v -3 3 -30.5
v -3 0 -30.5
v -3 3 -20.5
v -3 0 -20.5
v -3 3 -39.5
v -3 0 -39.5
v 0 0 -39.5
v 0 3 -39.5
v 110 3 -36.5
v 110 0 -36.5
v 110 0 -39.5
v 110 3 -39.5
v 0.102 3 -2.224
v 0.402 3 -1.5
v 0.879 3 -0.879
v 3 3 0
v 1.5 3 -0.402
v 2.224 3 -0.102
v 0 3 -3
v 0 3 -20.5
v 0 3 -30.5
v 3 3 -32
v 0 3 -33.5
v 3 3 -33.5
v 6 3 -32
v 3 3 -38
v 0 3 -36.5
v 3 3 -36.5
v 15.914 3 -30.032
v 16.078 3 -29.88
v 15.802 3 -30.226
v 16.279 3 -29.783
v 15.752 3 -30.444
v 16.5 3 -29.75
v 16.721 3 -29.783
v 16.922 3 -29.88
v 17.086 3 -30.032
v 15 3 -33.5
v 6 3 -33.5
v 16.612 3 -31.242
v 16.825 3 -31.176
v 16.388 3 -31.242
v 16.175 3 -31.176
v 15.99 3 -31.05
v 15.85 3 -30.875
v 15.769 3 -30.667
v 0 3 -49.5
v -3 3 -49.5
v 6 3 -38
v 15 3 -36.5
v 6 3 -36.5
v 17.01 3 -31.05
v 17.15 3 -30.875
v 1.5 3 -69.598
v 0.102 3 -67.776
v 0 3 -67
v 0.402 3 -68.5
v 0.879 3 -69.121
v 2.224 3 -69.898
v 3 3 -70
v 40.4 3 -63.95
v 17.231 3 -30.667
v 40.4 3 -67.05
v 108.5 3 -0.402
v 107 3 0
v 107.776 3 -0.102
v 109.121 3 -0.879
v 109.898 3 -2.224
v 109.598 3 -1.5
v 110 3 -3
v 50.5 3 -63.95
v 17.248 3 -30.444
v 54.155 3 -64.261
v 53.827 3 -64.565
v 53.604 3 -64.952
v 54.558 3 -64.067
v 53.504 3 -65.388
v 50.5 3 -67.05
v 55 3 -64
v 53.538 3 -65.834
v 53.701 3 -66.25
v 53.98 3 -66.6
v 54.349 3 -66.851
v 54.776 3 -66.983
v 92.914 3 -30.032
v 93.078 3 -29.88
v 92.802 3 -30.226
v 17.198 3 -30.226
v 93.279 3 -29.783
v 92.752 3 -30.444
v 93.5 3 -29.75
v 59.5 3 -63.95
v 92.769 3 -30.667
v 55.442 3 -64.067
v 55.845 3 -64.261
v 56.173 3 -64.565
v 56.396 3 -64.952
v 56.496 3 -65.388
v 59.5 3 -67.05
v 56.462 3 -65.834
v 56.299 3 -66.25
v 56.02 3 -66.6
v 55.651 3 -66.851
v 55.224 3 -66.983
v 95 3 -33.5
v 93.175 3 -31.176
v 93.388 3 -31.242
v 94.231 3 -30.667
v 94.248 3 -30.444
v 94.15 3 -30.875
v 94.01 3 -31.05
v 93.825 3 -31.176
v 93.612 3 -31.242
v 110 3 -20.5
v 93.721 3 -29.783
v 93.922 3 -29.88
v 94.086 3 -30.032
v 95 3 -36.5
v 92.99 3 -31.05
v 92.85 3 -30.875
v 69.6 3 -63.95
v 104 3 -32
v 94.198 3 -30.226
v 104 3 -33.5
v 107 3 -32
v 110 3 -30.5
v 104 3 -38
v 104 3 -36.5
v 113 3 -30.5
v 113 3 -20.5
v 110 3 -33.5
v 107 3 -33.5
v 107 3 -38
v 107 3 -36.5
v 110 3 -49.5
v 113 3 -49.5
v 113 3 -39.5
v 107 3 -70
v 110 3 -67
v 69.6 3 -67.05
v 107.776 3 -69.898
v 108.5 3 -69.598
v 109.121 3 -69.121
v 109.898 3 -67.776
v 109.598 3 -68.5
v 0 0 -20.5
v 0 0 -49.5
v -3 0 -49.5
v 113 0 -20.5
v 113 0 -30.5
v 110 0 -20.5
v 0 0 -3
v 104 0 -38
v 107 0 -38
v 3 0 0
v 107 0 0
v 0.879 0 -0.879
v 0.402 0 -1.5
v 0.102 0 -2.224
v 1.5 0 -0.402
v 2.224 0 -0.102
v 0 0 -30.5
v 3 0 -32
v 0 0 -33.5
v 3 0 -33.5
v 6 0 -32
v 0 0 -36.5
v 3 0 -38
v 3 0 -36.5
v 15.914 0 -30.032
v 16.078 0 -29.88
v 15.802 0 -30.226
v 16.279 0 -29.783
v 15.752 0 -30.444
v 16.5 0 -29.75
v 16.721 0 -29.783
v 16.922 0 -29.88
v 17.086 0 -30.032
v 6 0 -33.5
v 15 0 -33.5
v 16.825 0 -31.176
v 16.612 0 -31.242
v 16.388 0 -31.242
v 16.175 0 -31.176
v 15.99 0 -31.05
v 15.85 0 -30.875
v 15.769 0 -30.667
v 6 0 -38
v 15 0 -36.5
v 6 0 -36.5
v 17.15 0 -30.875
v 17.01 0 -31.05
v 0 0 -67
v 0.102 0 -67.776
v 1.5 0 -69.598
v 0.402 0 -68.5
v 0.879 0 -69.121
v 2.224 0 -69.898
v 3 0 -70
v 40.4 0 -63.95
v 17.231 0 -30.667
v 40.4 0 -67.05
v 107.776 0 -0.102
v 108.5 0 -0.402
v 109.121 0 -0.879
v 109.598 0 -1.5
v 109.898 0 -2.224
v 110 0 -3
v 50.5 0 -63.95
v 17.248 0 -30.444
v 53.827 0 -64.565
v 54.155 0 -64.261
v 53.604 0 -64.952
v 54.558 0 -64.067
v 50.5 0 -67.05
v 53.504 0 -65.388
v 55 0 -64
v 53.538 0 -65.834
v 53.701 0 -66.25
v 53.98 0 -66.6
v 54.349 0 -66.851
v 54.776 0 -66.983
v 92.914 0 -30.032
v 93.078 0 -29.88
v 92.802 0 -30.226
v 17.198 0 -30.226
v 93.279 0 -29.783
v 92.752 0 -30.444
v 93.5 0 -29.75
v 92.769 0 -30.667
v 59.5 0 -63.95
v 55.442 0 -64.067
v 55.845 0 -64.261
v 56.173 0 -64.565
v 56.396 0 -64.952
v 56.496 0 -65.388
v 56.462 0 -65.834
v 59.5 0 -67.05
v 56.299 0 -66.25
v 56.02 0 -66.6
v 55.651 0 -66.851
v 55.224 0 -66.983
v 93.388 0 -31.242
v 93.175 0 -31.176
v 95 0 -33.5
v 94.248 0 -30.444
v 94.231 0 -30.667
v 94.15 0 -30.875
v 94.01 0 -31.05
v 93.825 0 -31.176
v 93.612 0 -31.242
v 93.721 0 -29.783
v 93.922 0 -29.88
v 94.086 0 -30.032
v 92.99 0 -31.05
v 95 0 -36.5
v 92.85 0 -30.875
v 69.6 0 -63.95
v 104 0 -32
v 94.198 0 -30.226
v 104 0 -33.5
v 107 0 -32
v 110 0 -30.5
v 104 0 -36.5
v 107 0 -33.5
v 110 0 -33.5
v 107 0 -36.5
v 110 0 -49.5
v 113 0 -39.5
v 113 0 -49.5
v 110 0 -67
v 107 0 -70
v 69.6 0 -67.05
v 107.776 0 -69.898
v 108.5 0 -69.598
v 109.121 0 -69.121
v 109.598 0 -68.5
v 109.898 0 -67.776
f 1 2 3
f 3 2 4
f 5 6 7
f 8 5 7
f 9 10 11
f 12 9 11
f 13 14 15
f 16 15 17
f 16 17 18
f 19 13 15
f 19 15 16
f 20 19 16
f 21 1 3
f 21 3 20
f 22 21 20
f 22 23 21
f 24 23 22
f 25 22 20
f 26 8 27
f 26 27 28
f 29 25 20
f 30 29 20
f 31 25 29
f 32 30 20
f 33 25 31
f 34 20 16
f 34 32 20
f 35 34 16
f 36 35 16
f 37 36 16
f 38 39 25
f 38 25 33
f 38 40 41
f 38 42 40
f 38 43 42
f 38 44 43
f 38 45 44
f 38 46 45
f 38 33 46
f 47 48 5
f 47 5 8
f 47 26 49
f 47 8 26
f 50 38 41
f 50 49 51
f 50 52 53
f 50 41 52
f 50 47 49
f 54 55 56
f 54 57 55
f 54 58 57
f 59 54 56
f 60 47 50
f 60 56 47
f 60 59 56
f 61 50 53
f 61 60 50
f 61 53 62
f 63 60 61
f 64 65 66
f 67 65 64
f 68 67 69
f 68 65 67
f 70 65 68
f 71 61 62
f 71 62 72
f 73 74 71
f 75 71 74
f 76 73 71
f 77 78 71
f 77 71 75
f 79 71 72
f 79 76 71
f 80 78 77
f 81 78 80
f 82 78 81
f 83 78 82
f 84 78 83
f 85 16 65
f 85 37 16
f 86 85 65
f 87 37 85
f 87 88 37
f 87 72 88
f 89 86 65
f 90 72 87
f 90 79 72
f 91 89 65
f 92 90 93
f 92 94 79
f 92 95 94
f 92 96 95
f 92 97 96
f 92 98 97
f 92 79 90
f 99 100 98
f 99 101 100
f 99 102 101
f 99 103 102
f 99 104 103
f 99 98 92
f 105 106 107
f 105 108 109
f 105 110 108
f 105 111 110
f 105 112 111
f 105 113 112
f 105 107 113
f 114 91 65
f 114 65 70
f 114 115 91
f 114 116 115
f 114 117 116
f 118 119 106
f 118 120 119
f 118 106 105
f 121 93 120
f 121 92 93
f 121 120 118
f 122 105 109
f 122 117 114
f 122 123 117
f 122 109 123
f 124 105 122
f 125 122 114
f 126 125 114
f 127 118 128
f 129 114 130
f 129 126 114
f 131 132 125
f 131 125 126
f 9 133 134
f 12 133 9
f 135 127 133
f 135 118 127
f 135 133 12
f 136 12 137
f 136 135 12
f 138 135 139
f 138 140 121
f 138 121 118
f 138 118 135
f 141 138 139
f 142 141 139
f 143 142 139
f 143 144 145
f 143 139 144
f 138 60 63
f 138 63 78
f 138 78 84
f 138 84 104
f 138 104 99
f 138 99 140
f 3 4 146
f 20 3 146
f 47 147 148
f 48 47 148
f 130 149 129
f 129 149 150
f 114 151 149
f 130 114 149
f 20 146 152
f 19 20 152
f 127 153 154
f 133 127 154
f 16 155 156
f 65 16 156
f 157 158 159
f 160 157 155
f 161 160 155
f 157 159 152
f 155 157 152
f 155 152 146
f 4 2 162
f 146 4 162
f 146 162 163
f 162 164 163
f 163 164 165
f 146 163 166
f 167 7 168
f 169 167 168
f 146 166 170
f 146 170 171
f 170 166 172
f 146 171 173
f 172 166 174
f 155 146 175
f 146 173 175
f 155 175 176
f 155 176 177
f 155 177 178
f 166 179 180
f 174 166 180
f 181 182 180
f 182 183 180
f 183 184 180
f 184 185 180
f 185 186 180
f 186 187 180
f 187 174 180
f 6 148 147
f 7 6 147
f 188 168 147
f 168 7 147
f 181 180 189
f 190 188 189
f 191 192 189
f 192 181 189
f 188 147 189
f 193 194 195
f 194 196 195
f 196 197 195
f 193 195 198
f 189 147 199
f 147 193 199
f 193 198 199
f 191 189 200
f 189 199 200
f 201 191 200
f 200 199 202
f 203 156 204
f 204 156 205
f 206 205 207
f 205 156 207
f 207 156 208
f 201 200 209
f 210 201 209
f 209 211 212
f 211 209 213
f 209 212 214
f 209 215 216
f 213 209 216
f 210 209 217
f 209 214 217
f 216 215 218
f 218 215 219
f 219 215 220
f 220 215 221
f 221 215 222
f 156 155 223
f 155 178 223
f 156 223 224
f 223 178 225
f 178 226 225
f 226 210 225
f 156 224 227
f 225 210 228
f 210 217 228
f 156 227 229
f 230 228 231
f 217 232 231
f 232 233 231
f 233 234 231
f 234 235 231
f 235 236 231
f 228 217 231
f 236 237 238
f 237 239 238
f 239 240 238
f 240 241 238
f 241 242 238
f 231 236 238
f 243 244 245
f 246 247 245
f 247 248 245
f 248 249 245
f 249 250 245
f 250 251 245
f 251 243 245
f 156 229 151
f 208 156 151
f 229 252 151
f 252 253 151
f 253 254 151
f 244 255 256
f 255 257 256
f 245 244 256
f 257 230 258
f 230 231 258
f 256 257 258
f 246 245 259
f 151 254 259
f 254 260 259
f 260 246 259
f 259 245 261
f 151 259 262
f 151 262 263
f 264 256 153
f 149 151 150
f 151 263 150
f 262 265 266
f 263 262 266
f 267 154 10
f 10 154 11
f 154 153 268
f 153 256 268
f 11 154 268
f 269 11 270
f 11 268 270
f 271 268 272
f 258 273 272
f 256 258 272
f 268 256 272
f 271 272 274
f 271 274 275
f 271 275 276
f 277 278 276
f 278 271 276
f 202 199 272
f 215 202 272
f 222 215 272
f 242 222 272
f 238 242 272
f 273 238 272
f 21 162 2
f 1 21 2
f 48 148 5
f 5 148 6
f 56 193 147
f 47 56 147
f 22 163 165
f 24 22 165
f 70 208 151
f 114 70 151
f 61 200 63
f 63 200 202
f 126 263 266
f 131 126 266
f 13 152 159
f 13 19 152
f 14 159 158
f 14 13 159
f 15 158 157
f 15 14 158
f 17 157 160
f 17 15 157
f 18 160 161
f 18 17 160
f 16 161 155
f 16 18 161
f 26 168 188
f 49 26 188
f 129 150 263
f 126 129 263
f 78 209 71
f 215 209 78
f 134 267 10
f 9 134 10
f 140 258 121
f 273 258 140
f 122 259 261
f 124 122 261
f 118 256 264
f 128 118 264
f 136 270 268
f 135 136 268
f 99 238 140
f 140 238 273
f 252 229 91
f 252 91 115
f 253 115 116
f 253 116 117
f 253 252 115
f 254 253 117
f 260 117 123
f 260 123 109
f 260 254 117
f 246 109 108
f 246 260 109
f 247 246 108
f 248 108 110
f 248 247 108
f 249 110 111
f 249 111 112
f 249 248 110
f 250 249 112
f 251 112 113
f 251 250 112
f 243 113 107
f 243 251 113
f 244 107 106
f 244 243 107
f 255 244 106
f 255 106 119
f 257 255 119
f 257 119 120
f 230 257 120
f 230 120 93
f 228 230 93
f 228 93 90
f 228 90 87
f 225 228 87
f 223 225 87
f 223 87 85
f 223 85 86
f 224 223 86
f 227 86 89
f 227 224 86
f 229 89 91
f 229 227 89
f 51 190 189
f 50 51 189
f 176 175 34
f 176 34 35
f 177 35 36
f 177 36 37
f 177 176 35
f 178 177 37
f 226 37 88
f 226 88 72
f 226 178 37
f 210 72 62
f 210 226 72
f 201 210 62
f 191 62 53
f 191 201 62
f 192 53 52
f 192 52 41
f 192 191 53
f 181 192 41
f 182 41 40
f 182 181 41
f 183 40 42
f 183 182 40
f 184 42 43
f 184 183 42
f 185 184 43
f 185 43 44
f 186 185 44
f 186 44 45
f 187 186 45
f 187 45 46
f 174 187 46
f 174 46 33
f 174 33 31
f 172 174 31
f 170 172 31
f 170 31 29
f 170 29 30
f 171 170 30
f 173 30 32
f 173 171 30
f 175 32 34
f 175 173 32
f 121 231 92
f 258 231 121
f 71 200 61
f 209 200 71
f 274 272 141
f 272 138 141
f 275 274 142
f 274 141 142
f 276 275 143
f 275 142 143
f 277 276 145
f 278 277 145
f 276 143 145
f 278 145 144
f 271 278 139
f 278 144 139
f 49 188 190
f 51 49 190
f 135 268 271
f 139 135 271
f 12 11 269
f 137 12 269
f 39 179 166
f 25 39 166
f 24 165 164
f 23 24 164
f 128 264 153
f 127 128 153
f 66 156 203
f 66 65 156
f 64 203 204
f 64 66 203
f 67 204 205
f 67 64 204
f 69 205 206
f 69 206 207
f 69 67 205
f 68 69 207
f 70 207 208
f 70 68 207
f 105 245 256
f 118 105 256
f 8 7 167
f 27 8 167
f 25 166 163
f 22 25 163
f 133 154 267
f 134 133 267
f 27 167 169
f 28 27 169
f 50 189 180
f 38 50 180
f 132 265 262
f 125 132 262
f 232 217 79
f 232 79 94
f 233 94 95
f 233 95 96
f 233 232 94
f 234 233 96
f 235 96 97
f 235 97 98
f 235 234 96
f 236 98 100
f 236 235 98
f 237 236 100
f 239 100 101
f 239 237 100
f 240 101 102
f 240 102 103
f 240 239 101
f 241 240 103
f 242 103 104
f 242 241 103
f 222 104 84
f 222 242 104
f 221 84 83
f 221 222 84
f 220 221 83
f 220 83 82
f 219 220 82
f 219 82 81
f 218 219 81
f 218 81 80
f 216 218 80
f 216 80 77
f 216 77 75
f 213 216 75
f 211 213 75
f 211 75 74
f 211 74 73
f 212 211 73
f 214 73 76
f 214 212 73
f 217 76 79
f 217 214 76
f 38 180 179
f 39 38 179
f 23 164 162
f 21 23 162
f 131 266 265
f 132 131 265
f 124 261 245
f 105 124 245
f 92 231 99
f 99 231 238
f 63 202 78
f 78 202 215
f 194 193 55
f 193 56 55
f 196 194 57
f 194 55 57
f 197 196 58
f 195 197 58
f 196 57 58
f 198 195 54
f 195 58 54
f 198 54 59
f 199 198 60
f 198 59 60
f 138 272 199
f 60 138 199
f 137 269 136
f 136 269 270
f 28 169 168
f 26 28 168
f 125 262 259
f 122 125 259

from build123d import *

# Parameters (mm, degrees)
SKETCH1_R           = 0.75
SKETCH1_W           = 10.1
SKETCH1_H           = 3.1
SKETCH1_R_2         = 1.5
BOSS_EXTRUDE1_DEPTH = 3
FILLET1_R           = 3


with BuildPart() as part:
    # Sketch1 → Boss-Extrude1 (new body)
    with BuildSketch(Plane(origin=(0, 0, 0), x_dir=(1, 0, 0), z_dir=(0, 1, 0))):
        Polygon((0, 20.5), (0, 0), (110, 0), (110, 20.5), (113, 20.5), (113, 30.5), (110, 30.5), (110, 33.5), (107, 33.5), (107, 32), (104, 32), (104, 33.5), (95, 33.5), (95, 36.5), (104, 36.5), (104, 38), (107, 38), (107, 36.5), (110, 36.5), (110, 39.5), (113, 39.5), (113, 49.5), (110, 49.5), (110, 70), (0, 70), (0, 49.5), (-3, 49.5), (-3, 39.5), (0, 39.5), (0, 36.5), (3, 36.5), (3, 38), (6, 38), (6, 36.5), (15, 36.5), (15, 33.5), (6, 33.5), (6, 32), (3, 32), (3, 33.5), (0, 33.5), (0, 30.5), (-3, 30.5), (-3, 20.5), align=None)
        with Locations(Location((16.5, 30.5, 0), (0, 0, 270))):
            Circle(SKETCH1_R, mode=Mode.SUBTRACT)
        with Locations(Location((93.5, 30.5, 0), (0, 0, 270))):
            Circle(SKETCH1_R, mode=Mode.SUBTRACT)
        with Locations((45.45, 65.5)):
            Rectangle(SKETCH1_W, SKETCH1_H, mode=Mode.SUBTRACT)
        with Locations(Location((55, 65.5, 0), (0, 0, 270))):
            Circle(SKETCH1_R_2, mode=Mode.SUBTRACT)
        with Locations((64.55, 65.5)):
            Rectangle(SKETCH1_W, SKETCH1_H, mode=Mode.SUBTRACT)
    extrude(amount=BOSS_EXTRUDE1_DEPTH)

    # Fillet1
    fillet1_edges = [part.edges().sort_by_distance(p)[0] for p in [
        (110, 1.5, 0),
        (0, 1.5, 0),
        (0, 1.5, -70),
        (110, 1.5, -70),
    ]]
    fillet(fillet1_edges, radius=FILLET1_R)


solid = part.part
